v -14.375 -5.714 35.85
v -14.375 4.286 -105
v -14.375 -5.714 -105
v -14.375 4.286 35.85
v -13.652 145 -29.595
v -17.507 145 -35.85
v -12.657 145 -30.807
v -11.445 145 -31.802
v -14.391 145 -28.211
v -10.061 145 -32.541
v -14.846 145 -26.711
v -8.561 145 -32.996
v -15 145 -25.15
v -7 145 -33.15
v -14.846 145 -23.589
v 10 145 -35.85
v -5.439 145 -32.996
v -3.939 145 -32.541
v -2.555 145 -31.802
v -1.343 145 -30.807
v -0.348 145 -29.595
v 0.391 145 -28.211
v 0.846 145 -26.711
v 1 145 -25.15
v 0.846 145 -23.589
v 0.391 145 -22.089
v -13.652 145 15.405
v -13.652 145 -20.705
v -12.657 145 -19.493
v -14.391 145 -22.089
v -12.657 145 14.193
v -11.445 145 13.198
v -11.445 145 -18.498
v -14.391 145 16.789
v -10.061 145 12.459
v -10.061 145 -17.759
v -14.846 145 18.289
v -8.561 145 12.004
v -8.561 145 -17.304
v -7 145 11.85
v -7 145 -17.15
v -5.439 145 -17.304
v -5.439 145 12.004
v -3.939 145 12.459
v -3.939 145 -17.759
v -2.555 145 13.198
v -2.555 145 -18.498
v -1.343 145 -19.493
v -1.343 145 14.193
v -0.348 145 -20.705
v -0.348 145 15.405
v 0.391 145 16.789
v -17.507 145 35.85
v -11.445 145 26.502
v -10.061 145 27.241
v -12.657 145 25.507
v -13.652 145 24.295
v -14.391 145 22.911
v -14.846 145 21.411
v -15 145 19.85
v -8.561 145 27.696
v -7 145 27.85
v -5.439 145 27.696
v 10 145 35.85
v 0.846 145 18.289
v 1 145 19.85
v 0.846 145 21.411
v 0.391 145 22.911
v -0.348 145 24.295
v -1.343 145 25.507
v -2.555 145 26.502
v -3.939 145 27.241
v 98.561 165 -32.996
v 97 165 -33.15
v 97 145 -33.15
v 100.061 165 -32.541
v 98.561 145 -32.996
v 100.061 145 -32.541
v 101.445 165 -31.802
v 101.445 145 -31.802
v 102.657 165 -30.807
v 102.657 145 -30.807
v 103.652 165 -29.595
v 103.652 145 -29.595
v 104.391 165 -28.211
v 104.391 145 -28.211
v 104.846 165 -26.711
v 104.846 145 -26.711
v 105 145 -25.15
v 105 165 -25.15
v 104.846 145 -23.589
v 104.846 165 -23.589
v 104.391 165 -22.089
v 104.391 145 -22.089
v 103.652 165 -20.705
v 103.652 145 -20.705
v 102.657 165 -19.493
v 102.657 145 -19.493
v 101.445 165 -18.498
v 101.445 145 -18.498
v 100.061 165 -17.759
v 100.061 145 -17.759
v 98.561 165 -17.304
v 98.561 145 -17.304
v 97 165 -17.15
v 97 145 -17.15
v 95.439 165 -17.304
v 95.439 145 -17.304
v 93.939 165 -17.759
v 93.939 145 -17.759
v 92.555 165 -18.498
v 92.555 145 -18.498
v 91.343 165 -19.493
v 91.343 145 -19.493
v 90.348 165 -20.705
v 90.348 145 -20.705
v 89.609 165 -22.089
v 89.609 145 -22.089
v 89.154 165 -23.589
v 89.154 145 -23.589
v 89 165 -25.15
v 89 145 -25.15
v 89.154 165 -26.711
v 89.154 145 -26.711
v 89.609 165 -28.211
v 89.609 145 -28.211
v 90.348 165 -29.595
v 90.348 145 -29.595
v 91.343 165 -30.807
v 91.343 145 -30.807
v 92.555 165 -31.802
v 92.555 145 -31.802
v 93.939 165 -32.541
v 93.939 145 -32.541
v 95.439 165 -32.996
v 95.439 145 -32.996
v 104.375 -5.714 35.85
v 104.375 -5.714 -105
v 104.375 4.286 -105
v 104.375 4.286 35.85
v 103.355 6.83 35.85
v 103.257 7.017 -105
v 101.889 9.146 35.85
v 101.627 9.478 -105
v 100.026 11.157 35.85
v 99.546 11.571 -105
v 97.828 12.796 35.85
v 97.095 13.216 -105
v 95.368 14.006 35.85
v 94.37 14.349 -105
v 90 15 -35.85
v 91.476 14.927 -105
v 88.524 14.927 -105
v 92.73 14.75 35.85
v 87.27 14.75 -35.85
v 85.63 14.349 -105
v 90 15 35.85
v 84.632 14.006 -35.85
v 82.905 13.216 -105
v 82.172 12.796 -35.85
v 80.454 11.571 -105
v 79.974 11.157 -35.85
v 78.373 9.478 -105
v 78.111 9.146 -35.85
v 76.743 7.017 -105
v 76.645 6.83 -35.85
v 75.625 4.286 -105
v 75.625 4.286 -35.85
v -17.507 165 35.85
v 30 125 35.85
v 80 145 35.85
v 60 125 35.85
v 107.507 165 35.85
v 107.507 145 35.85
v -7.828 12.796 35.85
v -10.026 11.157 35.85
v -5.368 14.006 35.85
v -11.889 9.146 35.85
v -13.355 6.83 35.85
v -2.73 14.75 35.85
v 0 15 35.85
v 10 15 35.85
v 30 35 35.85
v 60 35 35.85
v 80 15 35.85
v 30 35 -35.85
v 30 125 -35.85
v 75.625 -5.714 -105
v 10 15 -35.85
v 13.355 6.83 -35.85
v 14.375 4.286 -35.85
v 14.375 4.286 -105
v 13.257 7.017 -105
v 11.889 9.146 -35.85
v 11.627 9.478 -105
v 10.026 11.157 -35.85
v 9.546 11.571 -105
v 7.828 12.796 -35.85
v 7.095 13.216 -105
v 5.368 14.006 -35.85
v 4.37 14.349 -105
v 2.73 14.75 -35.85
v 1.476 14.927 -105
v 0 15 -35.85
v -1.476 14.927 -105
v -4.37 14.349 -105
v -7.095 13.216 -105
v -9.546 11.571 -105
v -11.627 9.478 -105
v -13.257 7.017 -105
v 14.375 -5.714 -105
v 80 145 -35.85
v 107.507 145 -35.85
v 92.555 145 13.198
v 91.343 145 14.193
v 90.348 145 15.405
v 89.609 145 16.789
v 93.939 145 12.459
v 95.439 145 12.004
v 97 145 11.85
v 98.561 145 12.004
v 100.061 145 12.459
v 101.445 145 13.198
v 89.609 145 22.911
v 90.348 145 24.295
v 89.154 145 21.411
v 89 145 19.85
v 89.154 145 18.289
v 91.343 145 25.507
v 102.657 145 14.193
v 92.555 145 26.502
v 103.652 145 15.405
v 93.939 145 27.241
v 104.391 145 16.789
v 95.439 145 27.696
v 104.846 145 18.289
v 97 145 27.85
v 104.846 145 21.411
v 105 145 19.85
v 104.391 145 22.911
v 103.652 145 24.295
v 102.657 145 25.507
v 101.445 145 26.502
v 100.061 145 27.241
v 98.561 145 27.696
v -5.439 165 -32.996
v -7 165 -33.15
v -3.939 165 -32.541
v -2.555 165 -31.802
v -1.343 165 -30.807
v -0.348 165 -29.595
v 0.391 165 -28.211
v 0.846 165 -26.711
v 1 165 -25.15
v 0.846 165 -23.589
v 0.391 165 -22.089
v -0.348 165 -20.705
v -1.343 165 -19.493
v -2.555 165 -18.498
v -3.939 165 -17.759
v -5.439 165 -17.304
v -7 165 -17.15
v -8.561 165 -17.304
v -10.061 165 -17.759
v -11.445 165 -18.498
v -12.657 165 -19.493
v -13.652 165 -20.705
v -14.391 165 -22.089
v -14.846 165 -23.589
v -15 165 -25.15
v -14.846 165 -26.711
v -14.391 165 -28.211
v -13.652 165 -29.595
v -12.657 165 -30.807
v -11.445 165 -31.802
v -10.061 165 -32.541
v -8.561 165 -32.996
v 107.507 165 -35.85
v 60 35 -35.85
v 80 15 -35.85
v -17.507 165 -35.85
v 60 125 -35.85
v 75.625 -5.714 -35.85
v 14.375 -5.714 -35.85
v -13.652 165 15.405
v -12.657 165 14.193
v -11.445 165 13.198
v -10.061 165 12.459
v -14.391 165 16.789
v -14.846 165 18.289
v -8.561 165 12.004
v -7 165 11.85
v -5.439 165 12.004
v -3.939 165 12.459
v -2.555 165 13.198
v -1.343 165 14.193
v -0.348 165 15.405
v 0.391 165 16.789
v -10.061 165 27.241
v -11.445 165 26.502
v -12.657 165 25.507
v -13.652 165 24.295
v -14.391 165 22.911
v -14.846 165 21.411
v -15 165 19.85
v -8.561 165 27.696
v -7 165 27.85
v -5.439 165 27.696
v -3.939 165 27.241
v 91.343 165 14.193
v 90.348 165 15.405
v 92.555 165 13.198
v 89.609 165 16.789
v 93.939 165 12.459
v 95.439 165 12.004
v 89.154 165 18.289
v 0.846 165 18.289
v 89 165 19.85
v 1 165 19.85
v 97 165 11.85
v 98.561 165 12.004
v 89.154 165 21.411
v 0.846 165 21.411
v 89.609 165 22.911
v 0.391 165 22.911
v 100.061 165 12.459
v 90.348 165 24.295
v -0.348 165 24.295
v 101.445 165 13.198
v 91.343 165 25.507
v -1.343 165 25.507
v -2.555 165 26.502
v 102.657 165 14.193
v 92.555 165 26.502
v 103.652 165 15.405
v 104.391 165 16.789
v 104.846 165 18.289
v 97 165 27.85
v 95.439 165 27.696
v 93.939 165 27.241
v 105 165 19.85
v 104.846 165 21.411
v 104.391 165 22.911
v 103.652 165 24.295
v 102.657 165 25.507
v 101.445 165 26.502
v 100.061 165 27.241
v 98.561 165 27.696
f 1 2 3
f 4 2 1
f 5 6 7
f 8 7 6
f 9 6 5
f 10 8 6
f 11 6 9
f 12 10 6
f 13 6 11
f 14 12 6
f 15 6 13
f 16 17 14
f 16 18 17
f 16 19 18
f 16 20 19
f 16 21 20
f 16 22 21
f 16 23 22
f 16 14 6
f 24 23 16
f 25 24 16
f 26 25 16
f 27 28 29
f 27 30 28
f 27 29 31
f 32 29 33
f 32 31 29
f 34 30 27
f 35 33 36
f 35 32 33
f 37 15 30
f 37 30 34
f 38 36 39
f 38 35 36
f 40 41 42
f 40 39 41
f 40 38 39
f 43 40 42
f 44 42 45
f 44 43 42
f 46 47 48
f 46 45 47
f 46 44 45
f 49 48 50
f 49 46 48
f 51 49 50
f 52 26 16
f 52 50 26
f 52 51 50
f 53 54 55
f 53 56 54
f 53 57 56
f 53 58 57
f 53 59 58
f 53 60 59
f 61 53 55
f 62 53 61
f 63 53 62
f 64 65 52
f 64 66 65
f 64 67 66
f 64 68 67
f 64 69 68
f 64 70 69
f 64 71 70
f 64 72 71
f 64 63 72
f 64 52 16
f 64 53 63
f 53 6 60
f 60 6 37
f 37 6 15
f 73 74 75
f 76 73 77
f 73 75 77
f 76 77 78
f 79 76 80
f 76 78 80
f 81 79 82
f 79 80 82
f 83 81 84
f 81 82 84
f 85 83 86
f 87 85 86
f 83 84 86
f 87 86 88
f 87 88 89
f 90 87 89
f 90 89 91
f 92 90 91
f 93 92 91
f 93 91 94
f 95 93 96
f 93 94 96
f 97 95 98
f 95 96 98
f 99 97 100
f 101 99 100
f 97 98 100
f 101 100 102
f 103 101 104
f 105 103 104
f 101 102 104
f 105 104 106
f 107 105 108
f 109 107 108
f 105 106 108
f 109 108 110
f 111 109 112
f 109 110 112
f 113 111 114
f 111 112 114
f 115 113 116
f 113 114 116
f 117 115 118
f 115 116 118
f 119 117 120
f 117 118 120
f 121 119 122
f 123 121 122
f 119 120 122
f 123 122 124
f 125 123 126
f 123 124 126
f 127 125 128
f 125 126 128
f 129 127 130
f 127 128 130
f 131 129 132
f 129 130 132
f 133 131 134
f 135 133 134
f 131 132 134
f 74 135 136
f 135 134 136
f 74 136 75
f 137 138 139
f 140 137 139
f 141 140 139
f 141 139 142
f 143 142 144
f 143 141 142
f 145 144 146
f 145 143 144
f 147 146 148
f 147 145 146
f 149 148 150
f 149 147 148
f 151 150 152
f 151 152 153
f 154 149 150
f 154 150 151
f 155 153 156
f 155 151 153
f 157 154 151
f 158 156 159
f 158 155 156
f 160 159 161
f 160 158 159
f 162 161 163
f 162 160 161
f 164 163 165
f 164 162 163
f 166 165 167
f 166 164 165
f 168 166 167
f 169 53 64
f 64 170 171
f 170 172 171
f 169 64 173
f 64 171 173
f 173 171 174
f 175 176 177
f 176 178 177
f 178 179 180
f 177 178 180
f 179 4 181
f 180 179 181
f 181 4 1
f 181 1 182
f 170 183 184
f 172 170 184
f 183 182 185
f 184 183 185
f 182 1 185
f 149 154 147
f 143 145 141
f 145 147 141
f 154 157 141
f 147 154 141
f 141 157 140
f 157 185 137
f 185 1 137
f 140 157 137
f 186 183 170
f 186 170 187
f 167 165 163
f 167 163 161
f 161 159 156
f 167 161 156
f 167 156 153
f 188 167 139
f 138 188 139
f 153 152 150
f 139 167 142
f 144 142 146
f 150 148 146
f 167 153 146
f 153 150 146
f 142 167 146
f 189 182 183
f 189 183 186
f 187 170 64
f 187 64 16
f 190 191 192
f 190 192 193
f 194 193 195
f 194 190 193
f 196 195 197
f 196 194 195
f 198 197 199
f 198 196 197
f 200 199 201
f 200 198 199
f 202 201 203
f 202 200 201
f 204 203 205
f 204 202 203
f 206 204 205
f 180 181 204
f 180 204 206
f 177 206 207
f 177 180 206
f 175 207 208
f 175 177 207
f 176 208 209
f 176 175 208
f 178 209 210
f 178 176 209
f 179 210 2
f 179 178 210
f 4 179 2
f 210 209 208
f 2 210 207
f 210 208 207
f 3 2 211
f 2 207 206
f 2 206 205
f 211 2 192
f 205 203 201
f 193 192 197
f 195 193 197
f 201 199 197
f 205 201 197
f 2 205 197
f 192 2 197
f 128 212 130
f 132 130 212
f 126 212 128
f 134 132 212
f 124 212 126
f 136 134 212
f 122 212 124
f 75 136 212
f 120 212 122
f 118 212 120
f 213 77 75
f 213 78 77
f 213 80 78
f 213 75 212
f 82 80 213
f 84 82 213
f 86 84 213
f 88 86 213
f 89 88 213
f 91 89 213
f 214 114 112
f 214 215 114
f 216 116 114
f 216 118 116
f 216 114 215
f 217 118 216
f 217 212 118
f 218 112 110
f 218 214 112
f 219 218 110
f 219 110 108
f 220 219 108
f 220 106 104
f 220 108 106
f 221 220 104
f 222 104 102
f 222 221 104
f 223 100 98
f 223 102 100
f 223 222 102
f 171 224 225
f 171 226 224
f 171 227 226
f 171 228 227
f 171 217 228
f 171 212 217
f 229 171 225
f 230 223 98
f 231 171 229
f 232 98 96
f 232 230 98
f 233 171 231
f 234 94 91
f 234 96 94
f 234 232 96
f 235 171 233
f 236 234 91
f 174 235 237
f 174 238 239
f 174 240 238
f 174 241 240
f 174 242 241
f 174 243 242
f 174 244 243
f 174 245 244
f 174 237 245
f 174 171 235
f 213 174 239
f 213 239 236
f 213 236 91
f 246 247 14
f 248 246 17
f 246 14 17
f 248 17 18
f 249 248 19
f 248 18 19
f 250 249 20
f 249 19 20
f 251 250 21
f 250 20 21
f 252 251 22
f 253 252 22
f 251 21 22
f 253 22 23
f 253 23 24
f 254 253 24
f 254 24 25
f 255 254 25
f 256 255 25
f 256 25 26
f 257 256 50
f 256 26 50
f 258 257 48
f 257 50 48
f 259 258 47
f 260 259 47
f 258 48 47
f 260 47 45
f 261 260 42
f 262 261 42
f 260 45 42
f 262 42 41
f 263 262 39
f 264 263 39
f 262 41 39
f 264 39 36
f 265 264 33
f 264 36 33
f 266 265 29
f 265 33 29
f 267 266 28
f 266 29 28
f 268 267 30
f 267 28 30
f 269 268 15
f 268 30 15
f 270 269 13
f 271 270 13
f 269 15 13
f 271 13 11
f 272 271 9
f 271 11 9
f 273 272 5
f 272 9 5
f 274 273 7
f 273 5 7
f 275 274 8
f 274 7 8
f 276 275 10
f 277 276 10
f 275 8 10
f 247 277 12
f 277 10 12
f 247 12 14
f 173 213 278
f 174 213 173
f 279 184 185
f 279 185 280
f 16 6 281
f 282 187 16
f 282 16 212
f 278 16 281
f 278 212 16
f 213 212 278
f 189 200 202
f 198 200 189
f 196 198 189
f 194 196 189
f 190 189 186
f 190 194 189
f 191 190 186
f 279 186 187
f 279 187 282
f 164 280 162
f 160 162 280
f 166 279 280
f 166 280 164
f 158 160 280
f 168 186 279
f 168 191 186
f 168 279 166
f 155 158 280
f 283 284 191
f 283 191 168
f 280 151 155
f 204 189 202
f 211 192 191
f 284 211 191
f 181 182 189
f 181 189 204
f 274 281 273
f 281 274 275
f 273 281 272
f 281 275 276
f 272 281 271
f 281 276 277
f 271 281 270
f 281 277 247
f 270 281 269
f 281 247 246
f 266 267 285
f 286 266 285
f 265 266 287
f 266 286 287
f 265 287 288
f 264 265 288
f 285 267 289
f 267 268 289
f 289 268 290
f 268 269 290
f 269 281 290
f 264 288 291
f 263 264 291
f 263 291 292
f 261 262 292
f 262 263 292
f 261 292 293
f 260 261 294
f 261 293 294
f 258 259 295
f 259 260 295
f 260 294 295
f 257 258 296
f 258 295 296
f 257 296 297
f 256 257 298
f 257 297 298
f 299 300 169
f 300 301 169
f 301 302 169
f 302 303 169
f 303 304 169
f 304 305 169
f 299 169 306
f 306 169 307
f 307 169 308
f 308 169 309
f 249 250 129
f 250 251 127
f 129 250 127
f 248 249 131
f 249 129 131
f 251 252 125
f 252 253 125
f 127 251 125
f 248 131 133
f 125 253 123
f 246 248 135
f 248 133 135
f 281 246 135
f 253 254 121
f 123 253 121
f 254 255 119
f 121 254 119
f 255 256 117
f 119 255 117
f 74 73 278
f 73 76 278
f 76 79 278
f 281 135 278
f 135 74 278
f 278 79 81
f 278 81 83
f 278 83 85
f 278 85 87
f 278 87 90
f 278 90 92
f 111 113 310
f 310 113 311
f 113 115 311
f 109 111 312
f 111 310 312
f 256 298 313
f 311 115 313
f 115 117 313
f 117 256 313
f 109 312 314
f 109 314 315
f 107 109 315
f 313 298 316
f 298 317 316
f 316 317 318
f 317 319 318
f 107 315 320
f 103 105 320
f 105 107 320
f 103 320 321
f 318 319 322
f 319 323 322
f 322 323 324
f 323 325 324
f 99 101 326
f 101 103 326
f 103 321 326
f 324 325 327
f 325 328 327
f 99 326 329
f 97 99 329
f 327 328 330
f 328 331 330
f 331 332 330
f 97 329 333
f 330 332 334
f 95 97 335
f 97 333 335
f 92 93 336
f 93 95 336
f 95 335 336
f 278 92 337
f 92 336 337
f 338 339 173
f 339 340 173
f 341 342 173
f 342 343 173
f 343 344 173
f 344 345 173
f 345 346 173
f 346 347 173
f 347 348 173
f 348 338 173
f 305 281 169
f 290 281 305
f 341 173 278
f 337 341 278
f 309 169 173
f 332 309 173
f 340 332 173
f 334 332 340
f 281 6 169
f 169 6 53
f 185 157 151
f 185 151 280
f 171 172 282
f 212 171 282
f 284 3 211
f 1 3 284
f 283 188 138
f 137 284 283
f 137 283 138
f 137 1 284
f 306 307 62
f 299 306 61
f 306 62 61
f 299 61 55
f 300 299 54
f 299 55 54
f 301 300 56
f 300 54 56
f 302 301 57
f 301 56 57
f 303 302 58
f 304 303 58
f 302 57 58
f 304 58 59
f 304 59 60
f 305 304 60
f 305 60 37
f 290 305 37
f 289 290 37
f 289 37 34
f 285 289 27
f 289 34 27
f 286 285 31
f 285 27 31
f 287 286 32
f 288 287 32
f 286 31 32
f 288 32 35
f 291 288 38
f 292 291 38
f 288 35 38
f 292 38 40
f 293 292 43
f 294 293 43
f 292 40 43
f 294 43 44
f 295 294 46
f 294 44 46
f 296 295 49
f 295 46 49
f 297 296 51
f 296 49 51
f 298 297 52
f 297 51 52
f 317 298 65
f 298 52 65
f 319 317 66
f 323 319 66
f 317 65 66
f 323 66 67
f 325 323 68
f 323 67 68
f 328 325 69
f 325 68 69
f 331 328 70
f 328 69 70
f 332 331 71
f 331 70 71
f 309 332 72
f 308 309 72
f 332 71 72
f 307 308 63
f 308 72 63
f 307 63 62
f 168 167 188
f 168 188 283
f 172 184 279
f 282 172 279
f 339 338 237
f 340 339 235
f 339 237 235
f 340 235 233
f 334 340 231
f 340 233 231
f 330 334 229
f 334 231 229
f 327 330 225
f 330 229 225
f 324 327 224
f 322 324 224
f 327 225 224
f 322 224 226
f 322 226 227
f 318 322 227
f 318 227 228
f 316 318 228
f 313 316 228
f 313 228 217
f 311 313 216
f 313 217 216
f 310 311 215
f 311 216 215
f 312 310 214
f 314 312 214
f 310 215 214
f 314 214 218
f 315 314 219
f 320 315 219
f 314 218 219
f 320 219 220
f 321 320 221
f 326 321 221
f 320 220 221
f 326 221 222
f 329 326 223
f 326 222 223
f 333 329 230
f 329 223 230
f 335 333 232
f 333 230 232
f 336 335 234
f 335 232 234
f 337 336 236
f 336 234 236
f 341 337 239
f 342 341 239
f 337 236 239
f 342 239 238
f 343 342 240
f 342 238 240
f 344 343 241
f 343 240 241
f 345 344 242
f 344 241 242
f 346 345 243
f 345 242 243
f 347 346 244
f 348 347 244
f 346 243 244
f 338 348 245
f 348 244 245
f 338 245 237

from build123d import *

# Parameters (mm, degrees)
ESTRUSIONE_ESTRUSIONE1_DEPTH   = 105
ESTRUSIONE_ESTRUSIONE1_2_DEPTH = 105
SCHIZZO2_W                     = 28.749445424
SCHIZZO2_H                     = 105
ESTRUSIONE_ESTRUSIONE2_DEPTH   = 10
ESTRUSIONE_ESTRUSIONE3_DEPTH   = 35.85
SCHIZZO4_W                     = 30
SCHIZZO4_H                     = 71.7
ESTRUSIONE_ESTRUSIONE4_DEPTH   = 130
SCHIZZO5_W                     = 125.014718626
SCHIZZO5_H                     = 71.7
ESTRUSIONE_ESTRUSIONE5_DEPTH   = 20
SMUSSO1_SIZE                   = 20


with BuildPart() as part:
    # Schizzo1 → Estrusione-Estrusione1 (new body)
    with BuildSketch(Plane.XY):
        with BuildLine():
            ThreePointArc((14.374722712, 4.285714286), (0, 15), (-14.374722712, 4.285714286))
            Line((-14.374722712, 4.285714286), (14.374722712, 4.285714286))
        make_face()
    extrude(amount=-ESTRUSIONE_ESTRUSIONE1_DEPTH)



with BuildPart() as body_2:
    # Schizzo1 → Estrusione-Estrusione1 2 (new body)
    with BuildSketch(Plane.XY):
        with BuildLine():
            Line((75.625277288, 4.285714286), (104.374722712, 4.285714286))
            ThreePointArc((104.374722712, 4.285714286), (90, 15), (75.625277288, 4.285714286))
        make_face()
    extrude(amount=-ESTRUSIONE_ESTRUSIONE1_2_DEPTH)


with BuildPart() as part_1:
    add(part.part)

    add(body_2.part)  # Estrusione-Estrusione2 merges body 2
    # Schizzo2 → Estrusione-Estrusione2 (add)
    with BuildSketch(Plane.XZ.offset(-4.285714286)):
        with Locations((0, -52.5)):
            Rectangle(SCHIZZO2_W, SCHIZZO2_H)
        with Locations((90, -52.5)):
            Rectangle(SCHIZZO2_W, SCHIZZO2_H)
    extrude(amount=ESTRUSIONE_ESTRUSIONE2_DEPTH)

    # Schizzo3 → Estrusione-Estrusione3 (add, symmetric)
    with BuildSketch(Plane.XY):
        with BuildLine():
            Line((-14.374722712, -5.714285714), (104.374722712, -5.714285714))
            Line((104.374722712, -5.714285714), (104.374722712, 4.285714286))
            ThreePointArc((104.374722712, 4.285714286), (98.96421457, 12.026755886), (90, 15))
            Line((90, 15), (0, 15))
            ThreePointArc((0, 15), (-8.96421457, 12.026755886), (-14.374722712, 4.285714286))
            Line((-14.374722712, 4.285714286), (-14.374722712, -5.714285714))
        make_face()
    extrude(amount=ESTRUSIONE_ESTRUSIONE3_DEPTH, both=True)

    # Schizzo4 → Estrusione-Estrusione4 (add)
    with BuildSketch(Plane(origin=(0, 15, 0), x_dir=(1, 0, 0), z_dir=(0, 1, 0))):
        with Locations((45, 0)):
            Rectangle(SCHIZZO4_W, SCHIZZO4_H)
    extrude(amount=ESTRUSIONE_ESTRUSIONE4_DEPTH)

    # Schizzo5 → Estrusione-Estrusione5 (add)
    with BuildSketch(Plane(origin=(0, 145, -145), x_dir=(1, 0, 0), z_dir=(0, -1, 0))):
        with Locations((45, 145)):
            Rectangle(SCHIZZO5_W, SCHIZZO5_H)
        with BuildLine():
            ThreePointArc((97, 156.85), (105, 164.85), (97, 172.85))
            ThreePointArc((97, 172.85), (89, 164.85), (97, 156.85))
        make_face(mode=Mode.SUBTRACT)
        with BuildLine():
            ThreePointArc((97, 127.85), (89, 119.85), (97, 111.85))
            ThreePointArc((97, 111.85), (105, 119.85), (97, 127.85))
        make_face(mode=Mode.SUBTRACT)
        with BuildLine():
            ThreePointArc((-7, 127.85), (-15, 119.85), (-7, 111.85))
            ThreePointArc((-7, 111.85), (1, 119.85), (-7, 127.85))
        make_face(mode=Mode.SUBTRACT)
        with BuildLine():
            ThreePointArc((-7, 156.85), (1, 164.85), (-7, 172.85))
            ThreePointArc((-7, 172.85), (-15, 164.85), (-7, 156.85))
        make_face(mode=Mode.SUBTRACT)
    extrude(amount=-ESTRUSIONE_ESTRUSIONE5_DEPTH)

    # Smusso1
    smusso1_edges = [part_1.edges().sort_by_distance(p)[0] for p in [
        (30, 15, 0),
        (60, 15, 0),
        (30, 145, 0),
        (60, 145, 0),
    ]]
    chamfer(smusso1_edges, length=SMUSSO1_SIZE)


solid = part_1.part
